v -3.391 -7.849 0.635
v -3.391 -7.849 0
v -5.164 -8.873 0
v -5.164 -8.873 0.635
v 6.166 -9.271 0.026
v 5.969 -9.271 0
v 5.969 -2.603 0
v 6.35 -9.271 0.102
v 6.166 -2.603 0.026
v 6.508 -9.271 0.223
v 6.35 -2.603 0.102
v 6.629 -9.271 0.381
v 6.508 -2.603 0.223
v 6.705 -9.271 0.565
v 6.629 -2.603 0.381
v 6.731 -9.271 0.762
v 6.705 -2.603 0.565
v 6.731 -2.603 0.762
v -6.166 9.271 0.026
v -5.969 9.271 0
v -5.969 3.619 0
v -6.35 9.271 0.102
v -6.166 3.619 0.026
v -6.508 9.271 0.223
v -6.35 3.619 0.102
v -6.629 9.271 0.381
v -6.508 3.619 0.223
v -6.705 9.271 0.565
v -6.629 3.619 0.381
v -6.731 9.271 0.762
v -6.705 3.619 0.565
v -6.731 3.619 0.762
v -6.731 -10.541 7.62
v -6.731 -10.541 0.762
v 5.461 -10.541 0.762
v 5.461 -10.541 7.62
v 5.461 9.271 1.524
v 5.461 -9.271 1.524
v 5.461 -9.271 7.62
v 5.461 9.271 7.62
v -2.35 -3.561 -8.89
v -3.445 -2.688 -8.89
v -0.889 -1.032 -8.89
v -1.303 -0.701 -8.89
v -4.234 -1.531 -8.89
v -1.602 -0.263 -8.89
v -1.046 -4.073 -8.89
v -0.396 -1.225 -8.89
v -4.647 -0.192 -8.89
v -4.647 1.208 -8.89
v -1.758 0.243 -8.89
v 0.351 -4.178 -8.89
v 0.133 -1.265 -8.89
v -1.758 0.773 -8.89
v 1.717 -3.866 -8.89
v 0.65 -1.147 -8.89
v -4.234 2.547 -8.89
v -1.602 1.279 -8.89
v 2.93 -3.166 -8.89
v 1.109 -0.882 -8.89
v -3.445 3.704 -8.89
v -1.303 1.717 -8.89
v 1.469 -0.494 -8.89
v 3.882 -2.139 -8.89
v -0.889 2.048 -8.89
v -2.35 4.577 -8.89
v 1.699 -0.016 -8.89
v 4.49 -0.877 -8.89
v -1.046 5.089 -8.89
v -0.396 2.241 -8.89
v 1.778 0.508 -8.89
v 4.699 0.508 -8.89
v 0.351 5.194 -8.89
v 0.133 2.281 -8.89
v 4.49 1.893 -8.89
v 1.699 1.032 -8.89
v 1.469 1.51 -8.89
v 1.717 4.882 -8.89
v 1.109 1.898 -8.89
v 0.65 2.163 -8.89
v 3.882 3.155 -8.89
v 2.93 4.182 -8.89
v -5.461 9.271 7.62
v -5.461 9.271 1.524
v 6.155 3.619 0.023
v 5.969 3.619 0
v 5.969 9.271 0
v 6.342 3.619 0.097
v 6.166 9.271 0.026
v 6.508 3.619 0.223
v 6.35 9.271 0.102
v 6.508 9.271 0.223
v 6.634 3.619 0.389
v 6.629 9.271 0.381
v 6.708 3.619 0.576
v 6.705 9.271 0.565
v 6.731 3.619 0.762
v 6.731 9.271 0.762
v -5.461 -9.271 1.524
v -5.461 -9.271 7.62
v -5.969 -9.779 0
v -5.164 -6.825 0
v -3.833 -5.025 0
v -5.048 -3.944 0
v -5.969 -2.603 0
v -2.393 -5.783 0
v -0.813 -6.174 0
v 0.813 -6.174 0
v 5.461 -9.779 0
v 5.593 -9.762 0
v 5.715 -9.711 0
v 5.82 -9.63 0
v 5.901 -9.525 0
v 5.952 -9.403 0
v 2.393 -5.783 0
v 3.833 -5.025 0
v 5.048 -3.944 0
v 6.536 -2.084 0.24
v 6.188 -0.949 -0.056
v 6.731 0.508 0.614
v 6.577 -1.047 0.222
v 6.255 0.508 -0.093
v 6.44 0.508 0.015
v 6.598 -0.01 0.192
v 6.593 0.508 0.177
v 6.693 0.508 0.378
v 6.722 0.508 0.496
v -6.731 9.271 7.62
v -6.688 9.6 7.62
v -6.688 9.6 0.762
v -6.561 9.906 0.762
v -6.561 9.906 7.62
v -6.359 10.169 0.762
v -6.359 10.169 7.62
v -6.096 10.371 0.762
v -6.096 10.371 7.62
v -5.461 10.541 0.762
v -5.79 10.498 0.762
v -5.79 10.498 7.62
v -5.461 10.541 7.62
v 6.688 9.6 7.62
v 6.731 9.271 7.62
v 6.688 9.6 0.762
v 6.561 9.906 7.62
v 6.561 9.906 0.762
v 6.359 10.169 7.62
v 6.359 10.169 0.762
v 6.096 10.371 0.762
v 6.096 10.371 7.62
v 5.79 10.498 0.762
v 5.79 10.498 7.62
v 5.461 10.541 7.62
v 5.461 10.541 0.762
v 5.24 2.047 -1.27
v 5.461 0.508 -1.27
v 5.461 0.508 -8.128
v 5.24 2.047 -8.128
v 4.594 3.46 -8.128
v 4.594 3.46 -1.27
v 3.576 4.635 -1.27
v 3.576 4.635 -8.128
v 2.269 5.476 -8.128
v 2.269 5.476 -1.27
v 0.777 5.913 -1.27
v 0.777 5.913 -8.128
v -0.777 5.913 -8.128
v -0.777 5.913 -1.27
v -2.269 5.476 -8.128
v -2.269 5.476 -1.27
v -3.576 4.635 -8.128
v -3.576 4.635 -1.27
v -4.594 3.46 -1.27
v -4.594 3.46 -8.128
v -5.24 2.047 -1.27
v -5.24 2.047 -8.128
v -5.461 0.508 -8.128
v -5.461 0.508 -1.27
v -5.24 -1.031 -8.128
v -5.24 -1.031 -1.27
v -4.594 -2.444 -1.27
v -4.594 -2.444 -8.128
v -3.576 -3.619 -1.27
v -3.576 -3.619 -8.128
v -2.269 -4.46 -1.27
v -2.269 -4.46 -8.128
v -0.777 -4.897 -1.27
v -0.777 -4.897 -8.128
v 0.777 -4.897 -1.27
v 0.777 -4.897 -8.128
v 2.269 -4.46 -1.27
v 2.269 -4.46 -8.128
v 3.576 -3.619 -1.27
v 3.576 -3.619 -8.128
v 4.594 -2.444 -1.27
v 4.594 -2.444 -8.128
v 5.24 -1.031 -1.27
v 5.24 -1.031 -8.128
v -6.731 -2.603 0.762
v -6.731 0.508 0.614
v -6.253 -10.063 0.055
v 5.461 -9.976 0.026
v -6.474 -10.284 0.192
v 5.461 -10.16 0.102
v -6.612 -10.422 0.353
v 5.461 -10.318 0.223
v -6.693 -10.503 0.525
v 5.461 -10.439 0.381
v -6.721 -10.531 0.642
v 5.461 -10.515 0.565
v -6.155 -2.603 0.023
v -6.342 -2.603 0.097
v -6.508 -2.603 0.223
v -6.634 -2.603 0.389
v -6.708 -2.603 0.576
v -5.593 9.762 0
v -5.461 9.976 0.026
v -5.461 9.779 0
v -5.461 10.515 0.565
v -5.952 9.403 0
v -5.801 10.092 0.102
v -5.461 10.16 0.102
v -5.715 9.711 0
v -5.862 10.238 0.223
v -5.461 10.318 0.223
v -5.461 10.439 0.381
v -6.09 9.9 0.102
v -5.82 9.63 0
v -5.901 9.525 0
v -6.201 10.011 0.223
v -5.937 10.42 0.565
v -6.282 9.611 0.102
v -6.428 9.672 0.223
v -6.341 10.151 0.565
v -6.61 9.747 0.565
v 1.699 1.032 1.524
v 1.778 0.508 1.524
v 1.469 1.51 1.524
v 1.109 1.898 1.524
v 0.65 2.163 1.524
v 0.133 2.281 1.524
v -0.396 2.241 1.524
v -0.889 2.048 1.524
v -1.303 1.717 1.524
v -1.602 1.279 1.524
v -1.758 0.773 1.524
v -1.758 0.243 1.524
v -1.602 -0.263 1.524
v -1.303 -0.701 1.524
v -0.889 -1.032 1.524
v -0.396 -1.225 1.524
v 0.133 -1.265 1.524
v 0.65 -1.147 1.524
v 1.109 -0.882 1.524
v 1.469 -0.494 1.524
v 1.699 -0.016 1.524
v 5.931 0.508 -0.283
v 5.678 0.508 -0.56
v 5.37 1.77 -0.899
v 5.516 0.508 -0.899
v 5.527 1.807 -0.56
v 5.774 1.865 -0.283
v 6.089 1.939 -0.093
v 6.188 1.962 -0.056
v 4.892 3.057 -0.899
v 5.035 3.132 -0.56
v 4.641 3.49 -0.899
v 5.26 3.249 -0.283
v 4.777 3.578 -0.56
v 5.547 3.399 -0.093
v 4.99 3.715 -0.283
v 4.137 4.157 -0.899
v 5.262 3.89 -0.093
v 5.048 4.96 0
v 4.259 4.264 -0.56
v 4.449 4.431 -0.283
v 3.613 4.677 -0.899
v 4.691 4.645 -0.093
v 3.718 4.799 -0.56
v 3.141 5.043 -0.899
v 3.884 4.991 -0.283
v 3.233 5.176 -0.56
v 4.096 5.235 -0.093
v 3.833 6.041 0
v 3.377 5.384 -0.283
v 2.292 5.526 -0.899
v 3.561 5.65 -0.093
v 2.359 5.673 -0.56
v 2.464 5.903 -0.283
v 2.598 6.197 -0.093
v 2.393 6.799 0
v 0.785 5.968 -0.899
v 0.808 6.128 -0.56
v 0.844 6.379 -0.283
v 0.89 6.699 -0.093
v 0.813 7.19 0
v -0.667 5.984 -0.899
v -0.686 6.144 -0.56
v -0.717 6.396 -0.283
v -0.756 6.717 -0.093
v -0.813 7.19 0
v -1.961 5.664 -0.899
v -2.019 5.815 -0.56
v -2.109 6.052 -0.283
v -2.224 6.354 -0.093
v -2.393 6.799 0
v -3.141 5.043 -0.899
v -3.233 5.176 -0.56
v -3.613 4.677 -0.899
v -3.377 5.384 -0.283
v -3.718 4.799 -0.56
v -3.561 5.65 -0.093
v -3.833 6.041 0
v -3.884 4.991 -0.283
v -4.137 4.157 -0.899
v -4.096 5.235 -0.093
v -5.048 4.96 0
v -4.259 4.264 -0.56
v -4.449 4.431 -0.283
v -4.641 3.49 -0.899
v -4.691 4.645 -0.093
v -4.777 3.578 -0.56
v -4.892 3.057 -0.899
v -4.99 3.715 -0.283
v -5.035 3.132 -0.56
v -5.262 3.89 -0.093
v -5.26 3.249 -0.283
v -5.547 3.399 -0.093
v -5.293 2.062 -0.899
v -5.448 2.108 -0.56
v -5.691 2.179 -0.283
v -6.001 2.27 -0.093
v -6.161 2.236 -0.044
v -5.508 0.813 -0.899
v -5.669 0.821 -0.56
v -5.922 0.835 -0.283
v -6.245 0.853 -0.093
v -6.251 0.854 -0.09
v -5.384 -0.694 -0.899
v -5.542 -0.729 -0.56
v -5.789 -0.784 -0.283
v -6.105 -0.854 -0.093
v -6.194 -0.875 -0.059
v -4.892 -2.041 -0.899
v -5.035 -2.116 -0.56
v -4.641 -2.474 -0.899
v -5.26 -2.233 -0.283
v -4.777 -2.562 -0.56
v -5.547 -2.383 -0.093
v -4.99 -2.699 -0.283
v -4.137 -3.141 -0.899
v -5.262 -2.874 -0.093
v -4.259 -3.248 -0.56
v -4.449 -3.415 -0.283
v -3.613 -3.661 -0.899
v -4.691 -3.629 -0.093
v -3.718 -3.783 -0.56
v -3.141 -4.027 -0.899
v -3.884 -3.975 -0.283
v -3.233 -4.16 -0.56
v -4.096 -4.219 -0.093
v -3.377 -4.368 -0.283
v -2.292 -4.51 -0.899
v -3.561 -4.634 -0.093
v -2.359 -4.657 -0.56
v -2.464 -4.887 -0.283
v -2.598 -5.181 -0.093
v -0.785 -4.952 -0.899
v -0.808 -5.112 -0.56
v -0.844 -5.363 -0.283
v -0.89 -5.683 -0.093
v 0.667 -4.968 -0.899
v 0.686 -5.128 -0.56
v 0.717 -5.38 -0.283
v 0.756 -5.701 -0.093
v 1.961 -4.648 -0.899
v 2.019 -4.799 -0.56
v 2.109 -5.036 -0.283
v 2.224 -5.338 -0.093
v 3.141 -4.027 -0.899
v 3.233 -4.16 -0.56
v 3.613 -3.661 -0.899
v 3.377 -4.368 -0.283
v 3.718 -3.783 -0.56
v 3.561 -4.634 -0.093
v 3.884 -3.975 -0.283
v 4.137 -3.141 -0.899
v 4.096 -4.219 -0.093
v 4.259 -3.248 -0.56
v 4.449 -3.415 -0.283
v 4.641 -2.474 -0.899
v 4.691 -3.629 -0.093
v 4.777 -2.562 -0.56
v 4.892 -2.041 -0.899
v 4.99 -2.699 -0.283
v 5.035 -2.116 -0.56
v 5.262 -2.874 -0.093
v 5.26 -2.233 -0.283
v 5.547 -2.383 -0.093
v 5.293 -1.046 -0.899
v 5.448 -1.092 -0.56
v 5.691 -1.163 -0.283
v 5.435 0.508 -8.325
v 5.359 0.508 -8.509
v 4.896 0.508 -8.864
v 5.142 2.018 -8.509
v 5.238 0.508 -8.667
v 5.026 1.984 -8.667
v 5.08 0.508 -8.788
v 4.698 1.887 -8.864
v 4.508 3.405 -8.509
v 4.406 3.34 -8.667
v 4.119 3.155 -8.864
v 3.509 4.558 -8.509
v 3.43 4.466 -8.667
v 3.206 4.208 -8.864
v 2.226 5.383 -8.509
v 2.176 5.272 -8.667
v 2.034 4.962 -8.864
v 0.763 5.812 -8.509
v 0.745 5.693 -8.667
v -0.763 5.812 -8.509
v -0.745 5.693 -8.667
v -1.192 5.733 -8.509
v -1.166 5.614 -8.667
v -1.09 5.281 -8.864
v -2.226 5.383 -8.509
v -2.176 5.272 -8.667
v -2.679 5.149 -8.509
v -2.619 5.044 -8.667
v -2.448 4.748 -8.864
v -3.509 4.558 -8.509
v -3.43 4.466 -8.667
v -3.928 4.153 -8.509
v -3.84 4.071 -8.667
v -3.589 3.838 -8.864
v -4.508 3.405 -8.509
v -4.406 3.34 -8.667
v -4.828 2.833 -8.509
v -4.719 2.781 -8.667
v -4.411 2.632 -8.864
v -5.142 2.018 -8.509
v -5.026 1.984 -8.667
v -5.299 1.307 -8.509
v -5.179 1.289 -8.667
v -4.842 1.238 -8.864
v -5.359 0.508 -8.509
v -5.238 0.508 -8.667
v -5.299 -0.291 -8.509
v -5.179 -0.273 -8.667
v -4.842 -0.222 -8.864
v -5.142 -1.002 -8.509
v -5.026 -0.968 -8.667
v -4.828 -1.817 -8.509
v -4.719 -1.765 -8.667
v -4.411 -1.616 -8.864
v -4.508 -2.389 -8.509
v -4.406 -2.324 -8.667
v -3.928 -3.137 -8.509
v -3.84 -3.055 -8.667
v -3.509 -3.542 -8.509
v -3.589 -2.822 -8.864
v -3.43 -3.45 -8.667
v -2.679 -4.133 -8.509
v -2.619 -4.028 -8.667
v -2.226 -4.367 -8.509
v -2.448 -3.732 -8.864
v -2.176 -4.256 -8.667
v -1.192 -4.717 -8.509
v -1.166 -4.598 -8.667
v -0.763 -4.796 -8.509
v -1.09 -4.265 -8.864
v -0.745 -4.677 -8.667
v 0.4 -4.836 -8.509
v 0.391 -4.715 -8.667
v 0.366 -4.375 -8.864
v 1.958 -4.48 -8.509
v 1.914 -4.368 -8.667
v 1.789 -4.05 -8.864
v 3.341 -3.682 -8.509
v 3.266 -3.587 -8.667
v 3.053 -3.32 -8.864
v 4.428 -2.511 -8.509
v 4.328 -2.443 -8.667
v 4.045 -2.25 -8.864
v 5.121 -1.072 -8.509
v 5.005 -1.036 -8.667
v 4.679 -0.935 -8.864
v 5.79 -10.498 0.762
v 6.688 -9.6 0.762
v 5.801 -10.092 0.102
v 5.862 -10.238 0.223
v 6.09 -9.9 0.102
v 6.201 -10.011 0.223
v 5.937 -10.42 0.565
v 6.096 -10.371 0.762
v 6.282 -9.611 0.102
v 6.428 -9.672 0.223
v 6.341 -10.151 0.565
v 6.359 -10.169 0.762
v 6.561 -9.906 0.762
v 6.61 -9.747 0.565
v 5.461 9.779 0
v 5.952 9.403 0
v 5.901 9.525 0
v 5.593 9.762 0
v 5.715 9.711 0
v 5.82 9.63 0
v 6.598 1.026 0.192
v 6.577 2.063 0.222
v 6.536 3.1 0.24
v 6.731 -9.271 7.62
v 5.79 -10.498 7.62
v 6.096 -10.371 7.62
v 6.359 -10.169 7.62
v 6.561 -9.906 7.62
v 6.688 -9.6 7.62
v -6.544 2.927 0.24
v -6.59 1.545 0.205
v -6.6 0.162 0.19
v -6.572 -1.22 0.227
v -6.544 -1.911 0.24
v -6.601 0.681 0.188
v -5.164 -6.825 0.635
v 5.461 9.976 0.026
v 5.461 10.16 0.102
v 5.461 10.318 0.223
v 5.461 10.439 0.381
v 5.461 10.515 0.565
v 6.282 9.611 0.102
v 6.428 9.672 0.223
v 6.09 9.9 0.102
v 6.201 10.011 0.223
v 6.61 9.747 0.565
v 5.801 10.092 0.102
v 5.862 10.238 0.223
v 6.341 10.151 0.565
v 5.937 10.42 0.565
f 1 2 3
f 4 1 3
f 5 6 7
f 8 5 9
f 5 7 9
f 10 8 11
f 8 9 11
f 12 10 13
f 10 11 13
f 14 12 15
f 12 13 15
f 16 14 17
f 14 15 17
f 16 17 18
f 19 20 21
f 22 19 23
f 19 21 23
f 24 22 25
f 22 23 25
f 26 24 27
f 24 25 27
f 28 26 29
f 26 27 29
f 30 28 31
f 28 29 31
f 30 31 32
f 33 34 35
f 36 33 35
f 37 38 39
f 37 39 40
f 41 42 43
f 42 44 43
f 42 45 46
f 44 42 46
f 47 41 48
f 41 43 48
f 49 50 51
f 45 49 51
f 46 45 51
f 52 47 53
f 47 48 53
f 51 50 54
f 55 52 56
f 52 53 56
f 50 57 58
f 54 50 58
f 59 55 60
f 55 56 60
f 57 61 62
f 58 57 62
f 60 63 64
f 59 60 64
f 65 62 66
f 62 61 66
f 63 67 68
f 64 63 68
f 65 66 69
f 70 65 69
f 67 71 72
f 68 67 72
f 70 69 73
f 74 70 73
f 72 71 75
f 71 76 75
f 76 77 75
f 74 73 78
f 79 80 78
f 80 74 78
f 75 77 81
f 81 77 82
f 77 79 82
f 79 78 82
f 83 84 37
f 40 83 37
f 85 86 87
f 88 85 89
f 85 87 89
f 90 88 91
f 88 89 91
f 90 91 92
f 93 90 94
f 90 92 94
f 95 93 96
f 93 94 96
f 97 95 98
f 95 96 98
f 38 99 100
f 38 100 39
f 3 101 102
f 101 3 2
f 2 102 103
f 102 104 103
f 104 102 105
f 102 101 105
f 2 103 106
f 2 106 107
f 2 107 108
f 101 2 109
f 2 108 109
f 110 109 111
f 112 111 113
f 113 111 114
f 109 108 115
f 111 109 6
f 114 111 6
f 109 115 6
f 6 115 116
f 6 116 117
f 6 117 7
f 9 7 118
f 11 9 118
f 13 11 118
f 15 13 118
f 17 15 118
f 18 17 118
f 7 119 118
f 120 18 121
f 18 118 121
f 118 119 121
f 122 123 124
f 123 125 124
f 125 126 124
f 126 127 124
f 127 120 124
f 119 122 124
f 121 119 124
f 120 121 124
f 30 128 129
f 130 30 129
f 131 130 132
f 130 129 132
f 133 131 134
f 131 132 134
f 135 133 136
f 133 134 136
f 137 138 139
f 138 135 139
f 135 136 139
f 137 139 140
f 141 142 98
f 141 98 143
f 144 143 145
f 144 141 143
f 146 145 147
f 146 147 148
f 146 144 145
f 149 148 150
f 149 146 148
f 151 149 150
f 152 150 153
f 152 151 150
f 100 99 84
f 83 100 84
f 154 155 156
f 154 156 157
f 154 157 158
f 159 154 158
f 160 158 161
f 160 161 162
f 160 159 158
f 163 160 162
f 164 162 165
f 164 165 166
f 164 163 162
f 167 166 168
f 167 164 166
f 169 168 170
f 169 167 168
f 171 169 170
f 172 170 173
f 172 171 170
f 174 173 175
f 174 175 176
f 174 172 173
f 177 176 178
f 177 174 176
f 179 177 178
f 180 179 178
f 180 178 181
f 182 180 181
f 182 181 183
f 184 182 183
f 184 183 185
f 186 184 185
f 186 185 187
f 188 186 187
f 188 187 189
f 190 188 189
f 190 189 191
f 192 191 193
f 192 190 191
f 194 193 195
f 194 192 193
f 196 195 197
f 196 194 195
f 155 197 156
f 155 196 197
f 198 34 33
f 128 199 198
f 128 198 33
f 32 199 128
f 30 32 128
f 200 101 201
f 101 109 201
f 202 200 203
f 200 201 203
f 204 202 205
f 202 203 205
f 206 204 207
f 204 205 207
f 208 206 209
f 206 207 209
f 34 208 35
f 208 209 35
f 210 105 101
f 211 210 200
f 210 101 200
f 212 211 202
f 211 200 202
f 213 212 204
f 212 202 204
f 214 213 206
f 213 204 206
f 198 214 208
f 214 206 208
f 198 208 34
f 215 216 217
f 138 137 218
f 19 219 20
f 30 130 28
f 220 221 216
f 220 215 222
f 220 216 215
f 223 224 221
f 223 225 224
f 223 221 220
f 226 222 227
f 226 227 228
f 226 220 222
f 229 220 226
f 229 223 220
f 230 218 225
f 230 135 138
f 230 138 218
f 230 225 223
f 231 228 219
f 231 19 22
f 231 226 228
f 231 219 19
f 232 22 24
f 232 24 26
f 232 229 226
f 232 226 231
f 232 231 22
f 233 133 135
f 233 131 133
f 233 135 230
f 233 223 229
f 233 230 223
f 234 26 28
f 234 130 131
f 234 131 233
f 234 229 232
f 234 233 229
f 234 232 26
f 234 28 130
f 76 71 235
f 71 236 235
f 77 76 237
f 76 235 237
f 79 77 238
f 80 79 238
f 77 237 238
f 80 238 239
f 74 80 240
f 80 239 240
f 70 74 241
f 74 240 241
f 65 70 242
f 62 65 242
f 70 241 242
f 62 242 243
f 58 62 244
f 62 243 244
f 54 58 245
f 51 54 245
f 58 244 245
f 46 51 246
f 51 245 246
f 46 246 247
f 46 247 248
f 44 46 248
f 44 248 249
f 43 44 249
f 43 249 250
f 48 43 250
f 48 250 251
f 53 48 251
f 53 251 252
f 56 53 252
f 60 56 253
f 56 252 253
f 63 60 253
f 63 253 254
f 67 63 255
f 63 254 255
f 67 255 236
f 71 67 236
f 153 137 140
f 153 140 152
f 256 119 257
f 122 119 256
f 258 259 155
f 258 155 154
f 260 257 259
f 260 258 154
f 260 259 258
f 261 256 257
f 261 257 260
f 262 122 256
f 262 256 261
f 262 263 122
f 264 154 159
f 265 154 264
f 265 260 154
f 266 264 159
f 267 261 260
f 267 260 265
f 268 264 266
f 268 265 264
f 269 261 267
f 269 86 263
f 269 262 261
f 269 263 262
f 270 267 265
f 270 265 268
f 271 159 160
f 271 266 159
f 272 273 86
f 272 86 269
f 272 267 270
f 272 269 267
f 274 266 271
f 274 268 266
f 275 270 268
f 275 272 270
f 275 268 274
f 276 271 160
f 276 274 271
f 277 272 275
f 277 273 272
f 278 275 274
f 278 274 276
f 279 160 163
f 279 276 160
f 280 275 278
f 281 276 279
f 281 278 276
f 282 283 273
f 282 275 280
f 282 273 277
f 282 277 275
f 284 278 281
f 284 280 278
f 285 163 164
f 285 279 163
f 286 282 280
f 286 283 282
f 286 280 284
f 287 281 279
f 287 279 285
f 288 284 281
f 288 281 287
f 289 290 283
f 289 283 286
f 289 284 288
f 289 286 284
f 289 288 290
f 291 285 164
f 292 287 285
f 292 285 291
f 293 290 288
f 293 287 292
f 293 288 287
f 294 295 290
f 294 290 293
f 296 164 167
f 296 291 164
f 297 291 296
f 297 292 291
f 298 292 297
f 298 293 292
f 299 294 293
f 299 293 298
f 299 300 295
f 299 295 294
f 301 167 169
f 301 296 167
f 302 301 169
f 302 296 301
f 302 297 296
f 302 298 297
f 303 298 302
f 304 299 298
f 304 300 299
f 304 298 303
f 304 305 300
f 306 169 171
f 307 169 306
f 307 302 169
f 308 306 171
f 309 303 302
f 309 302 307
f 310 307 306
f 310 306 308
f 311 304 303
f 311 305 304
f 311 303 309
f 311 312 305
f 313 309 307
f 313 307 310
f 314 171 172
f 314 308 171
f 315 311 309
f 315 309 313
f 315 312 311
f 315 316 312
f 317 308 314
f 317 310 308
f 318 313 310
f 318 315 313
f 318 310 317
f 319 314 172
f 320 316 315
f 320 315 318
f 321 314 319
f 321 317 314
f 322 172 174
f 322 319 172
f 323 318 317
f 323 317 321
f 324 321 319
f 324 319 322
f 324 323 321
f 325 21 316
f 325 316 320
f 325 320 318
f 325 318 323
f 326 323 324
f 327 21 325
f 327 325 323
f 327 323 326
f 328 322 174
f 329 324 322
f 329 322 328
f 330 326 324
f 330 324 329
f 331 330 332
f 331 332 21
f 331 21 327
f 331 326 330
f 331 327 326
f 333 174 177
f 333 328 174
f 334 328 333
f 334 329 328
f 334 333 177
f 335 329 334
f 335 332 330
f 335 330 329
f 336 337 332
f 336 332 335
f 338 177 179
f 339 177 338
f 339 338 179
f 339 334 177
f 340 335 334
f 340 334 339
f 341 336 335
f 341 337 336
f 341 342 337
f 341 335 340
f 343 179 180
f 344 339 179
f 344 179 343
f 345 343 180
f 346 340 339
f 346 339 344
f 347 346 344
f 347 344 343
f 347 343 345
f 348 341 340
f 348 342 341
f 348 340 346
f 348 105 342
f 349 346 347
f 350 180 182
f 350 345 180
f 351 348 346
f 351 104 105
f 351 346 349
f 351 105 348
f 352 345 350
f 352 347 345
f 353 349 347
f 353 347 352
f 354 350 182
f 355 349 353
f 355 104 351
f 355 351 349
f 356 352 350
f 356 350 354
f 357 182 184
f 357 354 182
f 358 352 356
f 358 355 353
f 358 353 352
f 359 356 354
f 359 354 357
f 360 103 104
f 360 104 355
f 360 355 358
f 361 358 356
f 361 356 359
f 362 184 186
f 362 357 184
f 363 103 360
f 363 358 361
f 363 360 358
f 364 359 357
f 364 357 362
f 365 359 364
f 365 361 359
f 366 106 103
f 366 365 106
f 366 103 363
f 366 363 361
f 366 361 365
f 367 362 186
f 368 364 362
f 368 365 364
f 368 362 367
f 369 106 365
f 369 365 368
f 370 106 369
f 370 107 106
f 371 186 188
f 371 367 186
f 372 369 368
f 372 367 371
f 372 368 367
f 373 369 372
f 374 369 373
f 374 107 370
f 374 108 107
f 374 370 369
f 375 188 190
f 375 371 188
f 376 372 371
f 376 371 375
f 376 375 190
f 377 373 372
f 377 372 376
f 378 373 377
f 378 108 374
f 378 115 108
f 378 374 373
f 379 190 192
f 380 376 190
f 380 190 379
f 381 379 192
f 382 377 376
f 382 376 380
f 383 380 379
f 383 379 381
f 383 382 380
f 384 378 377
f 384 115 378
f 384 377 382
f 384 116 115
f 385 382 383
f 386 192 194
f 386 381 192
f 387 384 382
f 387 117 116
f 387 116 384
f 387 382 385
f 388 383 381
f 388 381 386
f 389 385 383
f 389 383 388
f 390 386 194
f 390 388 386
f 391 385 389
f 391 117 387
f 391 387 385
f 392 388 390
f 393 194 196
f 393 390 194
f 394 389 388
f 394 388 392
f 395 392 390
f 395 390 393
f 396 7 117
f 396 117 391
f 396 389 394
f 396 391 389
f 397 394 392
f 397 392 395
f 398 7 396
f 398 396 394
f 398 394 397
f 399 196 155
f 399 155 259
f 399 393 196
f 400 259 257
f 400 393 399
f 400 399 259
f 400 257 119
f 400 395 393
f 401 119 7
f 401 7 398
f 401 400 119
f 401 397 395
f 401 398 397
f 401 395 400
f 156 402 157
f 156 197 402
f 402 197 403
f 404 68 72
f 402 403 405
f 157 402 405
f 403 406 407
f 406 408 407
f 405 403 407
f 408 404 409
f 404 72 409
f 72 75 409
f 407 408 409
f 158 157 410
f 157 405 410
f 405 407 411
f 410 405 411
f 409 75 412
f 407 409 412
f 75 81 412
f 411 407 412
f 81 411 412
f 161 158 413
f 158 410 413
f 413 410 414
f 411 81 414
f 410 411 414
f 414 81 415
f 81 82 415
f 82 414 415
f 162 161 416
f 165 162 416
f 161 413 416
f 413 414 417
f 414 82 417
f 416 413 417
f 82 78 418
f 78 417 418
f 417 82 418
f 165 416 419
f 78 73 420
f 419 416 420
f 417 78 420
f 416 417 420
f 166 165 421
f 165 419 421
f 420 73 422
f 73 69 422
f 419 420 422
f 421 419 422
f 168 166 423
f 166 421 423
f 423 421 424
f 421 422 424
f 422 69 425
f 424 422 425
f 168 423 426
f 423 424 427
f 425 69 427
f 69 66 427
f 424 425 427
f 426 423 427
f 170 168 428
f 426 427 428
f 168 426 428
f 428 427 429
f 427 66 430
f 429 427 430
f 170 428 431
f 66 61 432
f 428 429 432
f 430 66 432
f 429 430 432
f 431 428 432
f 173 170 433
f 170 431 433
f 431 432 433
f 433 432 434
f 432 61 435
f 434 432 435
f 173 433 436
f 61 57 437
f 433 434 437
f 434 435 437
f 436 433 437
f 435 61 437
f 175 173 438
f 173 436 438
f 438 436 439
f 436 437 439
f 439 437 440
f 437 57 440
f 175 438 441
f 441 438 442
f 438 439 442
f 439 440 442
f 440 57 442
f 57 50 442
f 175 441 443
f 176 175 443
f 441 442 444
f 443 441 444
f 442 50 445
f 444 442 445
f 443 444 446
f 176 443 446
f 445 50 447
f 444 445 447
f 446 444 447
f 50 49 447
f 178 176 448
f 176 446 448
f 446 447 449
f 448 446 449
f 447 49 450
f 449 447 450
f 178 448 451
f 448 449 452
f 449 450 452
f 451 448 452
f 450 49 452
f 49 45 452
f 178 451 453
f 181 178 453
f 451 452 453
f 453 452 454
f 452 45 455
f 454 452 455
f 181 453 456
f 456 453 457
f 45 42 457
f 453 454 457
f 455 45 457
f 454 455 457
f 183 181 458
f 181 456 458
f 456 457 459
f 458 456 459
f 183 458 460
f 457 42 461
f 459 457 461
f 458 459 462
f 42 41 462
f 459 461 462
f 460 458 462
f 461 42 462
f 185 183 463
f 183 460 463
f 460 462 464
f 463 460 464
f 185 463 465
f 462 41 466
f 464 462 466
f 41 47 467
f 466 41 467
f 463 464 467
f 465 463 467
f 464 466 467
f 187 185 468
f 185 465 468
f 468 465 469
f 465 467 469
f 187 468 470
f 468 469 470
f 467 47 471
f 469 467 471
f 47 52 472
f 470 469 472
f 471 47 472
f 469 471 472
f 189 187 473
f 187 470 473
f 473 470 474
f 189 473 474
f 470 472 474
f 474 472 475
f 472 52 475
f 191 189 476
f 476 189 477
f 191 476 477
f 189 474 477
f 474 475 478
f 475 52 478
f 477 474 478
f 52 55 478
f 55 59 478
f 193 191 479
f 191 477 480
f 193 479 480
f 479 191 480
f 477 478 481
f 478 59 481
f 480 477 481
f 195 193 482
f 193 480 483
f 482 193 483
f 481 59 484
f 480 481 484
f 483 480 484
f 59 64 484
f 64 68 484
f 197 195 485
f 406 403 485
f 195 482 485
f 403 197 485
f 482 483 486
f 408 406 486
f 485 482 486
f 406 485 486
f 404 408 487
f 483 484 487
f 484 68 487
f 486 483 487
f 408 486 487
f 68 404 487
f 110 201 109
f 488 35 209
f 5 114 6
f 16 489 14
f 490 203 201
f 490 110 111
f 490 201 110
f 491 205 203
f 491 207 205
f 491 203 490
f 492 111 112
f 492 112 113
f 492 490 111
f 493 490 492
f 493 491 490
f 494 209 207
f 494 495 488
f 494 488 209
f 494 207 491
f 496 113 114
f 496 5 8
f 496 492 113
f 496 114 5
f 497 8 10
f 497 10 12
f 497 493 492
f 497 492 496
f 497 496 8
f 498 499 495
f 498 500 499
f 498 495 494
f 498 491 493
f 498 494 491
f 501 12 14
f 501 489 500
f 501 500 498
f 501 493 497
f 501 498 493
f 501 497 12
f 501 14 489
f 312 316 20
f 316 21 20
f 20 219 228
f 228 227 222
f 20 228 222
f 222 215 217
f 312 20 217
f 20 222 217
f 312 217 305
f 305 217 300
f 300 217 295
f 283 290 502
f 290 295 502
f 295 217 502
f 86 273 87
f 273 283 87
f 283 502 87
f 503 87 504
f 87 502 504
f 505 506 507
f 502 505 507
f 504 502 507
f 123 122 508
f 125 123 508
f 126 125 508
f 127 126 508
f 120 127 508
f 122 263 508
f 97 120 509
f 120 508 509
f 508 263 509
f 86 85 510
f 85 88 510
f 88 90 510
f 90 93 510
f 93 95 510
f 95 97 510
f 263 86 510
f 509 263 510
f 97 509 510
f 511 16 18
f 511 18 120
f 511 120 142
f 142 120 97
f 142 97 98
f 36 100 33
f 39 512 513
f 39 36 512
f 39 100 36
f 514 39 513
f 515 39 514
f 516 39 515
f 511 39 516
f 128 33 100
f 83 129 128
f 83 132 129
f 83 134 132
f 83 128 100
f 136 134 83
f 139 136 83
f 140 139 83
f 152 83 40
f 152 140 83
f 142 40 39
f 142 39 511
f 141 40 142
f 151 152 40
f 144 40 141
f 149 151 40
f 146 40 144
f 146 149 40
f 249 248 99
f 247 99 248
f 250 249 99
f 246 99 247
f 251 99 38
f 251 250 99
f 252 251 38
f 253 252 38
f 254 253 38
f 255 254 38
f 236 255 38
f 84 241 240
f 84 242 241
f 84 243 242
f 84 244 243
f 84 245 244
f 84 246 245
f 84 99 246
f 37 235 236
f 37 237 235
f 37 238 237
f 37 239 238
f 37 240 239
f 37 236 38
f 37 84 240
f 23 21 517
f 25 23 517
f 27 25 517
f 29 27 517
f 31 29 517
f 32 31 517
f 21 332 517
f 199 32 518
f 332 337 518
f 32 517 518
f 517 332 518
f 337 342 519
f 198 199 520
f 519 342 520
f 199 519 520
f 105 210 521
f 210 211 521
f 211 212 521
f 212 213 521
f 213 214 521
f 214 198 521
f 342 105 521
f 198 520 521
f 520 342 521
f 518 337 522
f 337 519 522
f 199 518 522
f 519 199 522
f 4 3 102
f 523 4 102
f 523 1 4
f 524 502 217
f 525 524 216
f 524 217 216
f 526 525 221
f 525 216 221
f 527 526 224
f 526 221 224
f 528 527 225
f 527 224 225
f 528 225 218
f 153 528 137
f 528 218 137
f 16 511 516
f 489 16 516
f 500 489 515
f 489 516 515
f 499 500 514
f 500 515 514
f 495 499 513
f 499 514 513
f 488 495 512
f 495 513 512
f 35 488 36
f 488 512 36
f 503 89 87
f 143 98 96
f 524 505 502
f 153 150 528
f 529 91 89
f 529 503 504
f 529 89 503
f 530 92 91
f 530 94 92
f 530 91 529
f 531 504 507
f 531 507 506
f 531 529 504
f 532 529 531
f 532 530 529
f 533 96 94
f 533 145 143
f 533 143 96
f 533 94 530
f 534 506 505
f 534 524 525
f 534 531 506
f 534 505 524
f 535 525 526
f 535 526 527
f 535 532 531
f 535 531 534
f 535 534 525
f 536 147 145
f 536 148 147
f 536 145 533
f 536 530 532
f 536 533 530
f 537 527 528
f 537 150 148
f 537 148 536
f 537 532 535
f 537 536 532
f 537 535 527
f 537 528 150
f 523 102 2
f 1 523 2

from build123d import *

# Parameters (mm, degrees)
SKETCH1_W           = 10.922
SKETCH1_H           = 18.542
BOSS_EXTRUDE1_DEPTH = 1.524
SKETCH3_R           = 5.461
SKETCH3_R_2         = 1.778
BOSS_EXTRUDE2_DEPTH = 8.89
SKETCH2_W           = 13.462
SKETCH2_H           = 21.082
SKETCH2_W_2         = 10.922
SKETCH2_H_2         = 18.542
EXTRUDE_THIN1_DEPTH = 7.62
CUT_EXTRUDE1_START  = -20.32
SKETCH4_R           = 1.778
CUT_EXTRUDE1_DEPTH  = 20.32
FILLET1_R           = 1.27
FILLET2_R           = 0.762
FILLET3_R           = 0.762
CUT_EXTRUDE2_DEPTH  = 0.635


with BuildPart() as part:
    # Sketch1 → Boss-Extrude1 (new body)
    with BuildSketch(Plane.XY):
        Rectangle(SKETCH1_W, SKETCH1_H)
    extrude(amount=BOSS_EXTRUDE1_DEPTH)

    # Sketch3 → Boss-Extrude2 (add)
    with BuildSketch(Plane.XY):
        with Locations((0, 0.508)):
            Circle(SKETCH3_R)
        with Locations((0, 0.508)):
            Circle(SKETCH3_R_2, mode=Mode.SUBTRACT)
    extrude(amount=-BOSS_EXTRUDE2_DEPTH)

    # Sketch2 → Extrude-Thin1 (add)
    with BuildSketch(Plane.XY):
        Rectangle(SKETCH2_W, SKETCH2_H)
        Rectangle(SKETCH2_W_2, SKETCH2_H_2, mode=Mode.SUBTRACT)
    extrude(amount=EXTRUDE_THIN1_DEPTH)

    # Sketch4 → Cut-Extrude1 (cut)
    with BuildSketch(Plane(origin=(0, 0, -8.89), x_dir=(-1, 0, 0), z_dir=(0, 0, -1)).offset(CUT_EXTRUDE1_START)):
        with Locations(Location((0, 0.508, 0), (0, 0, 180))):
            Circle(SKETCH4_R)
    extrude(amount=CUT_EXTRUDE1_DEPTH, mode=Mode.SUBTRACT)

    # Fillet1
    fillet1_edges = [part.edges().sort_by_distance(p)[0] for p in [
        (-5.461, 0.508, 0),
        (6.731, -10.541, 3.81),
        (6.731, 10.541, 3.81),
        (-6.731, 10.541, 3.81),
    ]]
    fillet(fillet1_edges, radius=FILLET1_R - 0.0001)  # a hair under: the kernel refuses the full size

    # Fillet2
    fillet2_edges = [part.edges().sort_by_distance(p)[0] for p in [
        (-5.461, 0.508, -8.89),
    ]]
    fillet(fillet2_edges, radius=FILLET2_R)

    # Fillet3
    fillet3_edges = [part.edges().sort_by_distance(p)[0] for p in [
        (-0.63495, -10.541, 0),
        (6.731, 0, 0),
        (6.731, 0, 0),
        (-6.731, -0.63495, 0),
        (-6.731, -0.63495, 0),
        (0, 10.541, 0),
        (-6.359054901, 10.169054901, 0),
        (6.359054901, 10.169054901, 0),
        (6.359054901, -10.169054901, 0),
    ]]
    fillet(fillet3_edges, radius=FILLET3_R)

    # Sketch5 → Cut-Extrude2 (cut)
    with BuildSketch(Plane(origin=(0, 0, 0), x_dir=(-1, 0, 0), z_dir=(0, 0, -1))):
        Polygon((3.390564192, -7.848738261), (5.164036584, -8.872653024), (5.164036584, -6.824823498), align=None)
    extrude(amount=-CUT_EXTRUDE2_DEPTH, mode=Mode.SUBTRACT)


solid = part.part
